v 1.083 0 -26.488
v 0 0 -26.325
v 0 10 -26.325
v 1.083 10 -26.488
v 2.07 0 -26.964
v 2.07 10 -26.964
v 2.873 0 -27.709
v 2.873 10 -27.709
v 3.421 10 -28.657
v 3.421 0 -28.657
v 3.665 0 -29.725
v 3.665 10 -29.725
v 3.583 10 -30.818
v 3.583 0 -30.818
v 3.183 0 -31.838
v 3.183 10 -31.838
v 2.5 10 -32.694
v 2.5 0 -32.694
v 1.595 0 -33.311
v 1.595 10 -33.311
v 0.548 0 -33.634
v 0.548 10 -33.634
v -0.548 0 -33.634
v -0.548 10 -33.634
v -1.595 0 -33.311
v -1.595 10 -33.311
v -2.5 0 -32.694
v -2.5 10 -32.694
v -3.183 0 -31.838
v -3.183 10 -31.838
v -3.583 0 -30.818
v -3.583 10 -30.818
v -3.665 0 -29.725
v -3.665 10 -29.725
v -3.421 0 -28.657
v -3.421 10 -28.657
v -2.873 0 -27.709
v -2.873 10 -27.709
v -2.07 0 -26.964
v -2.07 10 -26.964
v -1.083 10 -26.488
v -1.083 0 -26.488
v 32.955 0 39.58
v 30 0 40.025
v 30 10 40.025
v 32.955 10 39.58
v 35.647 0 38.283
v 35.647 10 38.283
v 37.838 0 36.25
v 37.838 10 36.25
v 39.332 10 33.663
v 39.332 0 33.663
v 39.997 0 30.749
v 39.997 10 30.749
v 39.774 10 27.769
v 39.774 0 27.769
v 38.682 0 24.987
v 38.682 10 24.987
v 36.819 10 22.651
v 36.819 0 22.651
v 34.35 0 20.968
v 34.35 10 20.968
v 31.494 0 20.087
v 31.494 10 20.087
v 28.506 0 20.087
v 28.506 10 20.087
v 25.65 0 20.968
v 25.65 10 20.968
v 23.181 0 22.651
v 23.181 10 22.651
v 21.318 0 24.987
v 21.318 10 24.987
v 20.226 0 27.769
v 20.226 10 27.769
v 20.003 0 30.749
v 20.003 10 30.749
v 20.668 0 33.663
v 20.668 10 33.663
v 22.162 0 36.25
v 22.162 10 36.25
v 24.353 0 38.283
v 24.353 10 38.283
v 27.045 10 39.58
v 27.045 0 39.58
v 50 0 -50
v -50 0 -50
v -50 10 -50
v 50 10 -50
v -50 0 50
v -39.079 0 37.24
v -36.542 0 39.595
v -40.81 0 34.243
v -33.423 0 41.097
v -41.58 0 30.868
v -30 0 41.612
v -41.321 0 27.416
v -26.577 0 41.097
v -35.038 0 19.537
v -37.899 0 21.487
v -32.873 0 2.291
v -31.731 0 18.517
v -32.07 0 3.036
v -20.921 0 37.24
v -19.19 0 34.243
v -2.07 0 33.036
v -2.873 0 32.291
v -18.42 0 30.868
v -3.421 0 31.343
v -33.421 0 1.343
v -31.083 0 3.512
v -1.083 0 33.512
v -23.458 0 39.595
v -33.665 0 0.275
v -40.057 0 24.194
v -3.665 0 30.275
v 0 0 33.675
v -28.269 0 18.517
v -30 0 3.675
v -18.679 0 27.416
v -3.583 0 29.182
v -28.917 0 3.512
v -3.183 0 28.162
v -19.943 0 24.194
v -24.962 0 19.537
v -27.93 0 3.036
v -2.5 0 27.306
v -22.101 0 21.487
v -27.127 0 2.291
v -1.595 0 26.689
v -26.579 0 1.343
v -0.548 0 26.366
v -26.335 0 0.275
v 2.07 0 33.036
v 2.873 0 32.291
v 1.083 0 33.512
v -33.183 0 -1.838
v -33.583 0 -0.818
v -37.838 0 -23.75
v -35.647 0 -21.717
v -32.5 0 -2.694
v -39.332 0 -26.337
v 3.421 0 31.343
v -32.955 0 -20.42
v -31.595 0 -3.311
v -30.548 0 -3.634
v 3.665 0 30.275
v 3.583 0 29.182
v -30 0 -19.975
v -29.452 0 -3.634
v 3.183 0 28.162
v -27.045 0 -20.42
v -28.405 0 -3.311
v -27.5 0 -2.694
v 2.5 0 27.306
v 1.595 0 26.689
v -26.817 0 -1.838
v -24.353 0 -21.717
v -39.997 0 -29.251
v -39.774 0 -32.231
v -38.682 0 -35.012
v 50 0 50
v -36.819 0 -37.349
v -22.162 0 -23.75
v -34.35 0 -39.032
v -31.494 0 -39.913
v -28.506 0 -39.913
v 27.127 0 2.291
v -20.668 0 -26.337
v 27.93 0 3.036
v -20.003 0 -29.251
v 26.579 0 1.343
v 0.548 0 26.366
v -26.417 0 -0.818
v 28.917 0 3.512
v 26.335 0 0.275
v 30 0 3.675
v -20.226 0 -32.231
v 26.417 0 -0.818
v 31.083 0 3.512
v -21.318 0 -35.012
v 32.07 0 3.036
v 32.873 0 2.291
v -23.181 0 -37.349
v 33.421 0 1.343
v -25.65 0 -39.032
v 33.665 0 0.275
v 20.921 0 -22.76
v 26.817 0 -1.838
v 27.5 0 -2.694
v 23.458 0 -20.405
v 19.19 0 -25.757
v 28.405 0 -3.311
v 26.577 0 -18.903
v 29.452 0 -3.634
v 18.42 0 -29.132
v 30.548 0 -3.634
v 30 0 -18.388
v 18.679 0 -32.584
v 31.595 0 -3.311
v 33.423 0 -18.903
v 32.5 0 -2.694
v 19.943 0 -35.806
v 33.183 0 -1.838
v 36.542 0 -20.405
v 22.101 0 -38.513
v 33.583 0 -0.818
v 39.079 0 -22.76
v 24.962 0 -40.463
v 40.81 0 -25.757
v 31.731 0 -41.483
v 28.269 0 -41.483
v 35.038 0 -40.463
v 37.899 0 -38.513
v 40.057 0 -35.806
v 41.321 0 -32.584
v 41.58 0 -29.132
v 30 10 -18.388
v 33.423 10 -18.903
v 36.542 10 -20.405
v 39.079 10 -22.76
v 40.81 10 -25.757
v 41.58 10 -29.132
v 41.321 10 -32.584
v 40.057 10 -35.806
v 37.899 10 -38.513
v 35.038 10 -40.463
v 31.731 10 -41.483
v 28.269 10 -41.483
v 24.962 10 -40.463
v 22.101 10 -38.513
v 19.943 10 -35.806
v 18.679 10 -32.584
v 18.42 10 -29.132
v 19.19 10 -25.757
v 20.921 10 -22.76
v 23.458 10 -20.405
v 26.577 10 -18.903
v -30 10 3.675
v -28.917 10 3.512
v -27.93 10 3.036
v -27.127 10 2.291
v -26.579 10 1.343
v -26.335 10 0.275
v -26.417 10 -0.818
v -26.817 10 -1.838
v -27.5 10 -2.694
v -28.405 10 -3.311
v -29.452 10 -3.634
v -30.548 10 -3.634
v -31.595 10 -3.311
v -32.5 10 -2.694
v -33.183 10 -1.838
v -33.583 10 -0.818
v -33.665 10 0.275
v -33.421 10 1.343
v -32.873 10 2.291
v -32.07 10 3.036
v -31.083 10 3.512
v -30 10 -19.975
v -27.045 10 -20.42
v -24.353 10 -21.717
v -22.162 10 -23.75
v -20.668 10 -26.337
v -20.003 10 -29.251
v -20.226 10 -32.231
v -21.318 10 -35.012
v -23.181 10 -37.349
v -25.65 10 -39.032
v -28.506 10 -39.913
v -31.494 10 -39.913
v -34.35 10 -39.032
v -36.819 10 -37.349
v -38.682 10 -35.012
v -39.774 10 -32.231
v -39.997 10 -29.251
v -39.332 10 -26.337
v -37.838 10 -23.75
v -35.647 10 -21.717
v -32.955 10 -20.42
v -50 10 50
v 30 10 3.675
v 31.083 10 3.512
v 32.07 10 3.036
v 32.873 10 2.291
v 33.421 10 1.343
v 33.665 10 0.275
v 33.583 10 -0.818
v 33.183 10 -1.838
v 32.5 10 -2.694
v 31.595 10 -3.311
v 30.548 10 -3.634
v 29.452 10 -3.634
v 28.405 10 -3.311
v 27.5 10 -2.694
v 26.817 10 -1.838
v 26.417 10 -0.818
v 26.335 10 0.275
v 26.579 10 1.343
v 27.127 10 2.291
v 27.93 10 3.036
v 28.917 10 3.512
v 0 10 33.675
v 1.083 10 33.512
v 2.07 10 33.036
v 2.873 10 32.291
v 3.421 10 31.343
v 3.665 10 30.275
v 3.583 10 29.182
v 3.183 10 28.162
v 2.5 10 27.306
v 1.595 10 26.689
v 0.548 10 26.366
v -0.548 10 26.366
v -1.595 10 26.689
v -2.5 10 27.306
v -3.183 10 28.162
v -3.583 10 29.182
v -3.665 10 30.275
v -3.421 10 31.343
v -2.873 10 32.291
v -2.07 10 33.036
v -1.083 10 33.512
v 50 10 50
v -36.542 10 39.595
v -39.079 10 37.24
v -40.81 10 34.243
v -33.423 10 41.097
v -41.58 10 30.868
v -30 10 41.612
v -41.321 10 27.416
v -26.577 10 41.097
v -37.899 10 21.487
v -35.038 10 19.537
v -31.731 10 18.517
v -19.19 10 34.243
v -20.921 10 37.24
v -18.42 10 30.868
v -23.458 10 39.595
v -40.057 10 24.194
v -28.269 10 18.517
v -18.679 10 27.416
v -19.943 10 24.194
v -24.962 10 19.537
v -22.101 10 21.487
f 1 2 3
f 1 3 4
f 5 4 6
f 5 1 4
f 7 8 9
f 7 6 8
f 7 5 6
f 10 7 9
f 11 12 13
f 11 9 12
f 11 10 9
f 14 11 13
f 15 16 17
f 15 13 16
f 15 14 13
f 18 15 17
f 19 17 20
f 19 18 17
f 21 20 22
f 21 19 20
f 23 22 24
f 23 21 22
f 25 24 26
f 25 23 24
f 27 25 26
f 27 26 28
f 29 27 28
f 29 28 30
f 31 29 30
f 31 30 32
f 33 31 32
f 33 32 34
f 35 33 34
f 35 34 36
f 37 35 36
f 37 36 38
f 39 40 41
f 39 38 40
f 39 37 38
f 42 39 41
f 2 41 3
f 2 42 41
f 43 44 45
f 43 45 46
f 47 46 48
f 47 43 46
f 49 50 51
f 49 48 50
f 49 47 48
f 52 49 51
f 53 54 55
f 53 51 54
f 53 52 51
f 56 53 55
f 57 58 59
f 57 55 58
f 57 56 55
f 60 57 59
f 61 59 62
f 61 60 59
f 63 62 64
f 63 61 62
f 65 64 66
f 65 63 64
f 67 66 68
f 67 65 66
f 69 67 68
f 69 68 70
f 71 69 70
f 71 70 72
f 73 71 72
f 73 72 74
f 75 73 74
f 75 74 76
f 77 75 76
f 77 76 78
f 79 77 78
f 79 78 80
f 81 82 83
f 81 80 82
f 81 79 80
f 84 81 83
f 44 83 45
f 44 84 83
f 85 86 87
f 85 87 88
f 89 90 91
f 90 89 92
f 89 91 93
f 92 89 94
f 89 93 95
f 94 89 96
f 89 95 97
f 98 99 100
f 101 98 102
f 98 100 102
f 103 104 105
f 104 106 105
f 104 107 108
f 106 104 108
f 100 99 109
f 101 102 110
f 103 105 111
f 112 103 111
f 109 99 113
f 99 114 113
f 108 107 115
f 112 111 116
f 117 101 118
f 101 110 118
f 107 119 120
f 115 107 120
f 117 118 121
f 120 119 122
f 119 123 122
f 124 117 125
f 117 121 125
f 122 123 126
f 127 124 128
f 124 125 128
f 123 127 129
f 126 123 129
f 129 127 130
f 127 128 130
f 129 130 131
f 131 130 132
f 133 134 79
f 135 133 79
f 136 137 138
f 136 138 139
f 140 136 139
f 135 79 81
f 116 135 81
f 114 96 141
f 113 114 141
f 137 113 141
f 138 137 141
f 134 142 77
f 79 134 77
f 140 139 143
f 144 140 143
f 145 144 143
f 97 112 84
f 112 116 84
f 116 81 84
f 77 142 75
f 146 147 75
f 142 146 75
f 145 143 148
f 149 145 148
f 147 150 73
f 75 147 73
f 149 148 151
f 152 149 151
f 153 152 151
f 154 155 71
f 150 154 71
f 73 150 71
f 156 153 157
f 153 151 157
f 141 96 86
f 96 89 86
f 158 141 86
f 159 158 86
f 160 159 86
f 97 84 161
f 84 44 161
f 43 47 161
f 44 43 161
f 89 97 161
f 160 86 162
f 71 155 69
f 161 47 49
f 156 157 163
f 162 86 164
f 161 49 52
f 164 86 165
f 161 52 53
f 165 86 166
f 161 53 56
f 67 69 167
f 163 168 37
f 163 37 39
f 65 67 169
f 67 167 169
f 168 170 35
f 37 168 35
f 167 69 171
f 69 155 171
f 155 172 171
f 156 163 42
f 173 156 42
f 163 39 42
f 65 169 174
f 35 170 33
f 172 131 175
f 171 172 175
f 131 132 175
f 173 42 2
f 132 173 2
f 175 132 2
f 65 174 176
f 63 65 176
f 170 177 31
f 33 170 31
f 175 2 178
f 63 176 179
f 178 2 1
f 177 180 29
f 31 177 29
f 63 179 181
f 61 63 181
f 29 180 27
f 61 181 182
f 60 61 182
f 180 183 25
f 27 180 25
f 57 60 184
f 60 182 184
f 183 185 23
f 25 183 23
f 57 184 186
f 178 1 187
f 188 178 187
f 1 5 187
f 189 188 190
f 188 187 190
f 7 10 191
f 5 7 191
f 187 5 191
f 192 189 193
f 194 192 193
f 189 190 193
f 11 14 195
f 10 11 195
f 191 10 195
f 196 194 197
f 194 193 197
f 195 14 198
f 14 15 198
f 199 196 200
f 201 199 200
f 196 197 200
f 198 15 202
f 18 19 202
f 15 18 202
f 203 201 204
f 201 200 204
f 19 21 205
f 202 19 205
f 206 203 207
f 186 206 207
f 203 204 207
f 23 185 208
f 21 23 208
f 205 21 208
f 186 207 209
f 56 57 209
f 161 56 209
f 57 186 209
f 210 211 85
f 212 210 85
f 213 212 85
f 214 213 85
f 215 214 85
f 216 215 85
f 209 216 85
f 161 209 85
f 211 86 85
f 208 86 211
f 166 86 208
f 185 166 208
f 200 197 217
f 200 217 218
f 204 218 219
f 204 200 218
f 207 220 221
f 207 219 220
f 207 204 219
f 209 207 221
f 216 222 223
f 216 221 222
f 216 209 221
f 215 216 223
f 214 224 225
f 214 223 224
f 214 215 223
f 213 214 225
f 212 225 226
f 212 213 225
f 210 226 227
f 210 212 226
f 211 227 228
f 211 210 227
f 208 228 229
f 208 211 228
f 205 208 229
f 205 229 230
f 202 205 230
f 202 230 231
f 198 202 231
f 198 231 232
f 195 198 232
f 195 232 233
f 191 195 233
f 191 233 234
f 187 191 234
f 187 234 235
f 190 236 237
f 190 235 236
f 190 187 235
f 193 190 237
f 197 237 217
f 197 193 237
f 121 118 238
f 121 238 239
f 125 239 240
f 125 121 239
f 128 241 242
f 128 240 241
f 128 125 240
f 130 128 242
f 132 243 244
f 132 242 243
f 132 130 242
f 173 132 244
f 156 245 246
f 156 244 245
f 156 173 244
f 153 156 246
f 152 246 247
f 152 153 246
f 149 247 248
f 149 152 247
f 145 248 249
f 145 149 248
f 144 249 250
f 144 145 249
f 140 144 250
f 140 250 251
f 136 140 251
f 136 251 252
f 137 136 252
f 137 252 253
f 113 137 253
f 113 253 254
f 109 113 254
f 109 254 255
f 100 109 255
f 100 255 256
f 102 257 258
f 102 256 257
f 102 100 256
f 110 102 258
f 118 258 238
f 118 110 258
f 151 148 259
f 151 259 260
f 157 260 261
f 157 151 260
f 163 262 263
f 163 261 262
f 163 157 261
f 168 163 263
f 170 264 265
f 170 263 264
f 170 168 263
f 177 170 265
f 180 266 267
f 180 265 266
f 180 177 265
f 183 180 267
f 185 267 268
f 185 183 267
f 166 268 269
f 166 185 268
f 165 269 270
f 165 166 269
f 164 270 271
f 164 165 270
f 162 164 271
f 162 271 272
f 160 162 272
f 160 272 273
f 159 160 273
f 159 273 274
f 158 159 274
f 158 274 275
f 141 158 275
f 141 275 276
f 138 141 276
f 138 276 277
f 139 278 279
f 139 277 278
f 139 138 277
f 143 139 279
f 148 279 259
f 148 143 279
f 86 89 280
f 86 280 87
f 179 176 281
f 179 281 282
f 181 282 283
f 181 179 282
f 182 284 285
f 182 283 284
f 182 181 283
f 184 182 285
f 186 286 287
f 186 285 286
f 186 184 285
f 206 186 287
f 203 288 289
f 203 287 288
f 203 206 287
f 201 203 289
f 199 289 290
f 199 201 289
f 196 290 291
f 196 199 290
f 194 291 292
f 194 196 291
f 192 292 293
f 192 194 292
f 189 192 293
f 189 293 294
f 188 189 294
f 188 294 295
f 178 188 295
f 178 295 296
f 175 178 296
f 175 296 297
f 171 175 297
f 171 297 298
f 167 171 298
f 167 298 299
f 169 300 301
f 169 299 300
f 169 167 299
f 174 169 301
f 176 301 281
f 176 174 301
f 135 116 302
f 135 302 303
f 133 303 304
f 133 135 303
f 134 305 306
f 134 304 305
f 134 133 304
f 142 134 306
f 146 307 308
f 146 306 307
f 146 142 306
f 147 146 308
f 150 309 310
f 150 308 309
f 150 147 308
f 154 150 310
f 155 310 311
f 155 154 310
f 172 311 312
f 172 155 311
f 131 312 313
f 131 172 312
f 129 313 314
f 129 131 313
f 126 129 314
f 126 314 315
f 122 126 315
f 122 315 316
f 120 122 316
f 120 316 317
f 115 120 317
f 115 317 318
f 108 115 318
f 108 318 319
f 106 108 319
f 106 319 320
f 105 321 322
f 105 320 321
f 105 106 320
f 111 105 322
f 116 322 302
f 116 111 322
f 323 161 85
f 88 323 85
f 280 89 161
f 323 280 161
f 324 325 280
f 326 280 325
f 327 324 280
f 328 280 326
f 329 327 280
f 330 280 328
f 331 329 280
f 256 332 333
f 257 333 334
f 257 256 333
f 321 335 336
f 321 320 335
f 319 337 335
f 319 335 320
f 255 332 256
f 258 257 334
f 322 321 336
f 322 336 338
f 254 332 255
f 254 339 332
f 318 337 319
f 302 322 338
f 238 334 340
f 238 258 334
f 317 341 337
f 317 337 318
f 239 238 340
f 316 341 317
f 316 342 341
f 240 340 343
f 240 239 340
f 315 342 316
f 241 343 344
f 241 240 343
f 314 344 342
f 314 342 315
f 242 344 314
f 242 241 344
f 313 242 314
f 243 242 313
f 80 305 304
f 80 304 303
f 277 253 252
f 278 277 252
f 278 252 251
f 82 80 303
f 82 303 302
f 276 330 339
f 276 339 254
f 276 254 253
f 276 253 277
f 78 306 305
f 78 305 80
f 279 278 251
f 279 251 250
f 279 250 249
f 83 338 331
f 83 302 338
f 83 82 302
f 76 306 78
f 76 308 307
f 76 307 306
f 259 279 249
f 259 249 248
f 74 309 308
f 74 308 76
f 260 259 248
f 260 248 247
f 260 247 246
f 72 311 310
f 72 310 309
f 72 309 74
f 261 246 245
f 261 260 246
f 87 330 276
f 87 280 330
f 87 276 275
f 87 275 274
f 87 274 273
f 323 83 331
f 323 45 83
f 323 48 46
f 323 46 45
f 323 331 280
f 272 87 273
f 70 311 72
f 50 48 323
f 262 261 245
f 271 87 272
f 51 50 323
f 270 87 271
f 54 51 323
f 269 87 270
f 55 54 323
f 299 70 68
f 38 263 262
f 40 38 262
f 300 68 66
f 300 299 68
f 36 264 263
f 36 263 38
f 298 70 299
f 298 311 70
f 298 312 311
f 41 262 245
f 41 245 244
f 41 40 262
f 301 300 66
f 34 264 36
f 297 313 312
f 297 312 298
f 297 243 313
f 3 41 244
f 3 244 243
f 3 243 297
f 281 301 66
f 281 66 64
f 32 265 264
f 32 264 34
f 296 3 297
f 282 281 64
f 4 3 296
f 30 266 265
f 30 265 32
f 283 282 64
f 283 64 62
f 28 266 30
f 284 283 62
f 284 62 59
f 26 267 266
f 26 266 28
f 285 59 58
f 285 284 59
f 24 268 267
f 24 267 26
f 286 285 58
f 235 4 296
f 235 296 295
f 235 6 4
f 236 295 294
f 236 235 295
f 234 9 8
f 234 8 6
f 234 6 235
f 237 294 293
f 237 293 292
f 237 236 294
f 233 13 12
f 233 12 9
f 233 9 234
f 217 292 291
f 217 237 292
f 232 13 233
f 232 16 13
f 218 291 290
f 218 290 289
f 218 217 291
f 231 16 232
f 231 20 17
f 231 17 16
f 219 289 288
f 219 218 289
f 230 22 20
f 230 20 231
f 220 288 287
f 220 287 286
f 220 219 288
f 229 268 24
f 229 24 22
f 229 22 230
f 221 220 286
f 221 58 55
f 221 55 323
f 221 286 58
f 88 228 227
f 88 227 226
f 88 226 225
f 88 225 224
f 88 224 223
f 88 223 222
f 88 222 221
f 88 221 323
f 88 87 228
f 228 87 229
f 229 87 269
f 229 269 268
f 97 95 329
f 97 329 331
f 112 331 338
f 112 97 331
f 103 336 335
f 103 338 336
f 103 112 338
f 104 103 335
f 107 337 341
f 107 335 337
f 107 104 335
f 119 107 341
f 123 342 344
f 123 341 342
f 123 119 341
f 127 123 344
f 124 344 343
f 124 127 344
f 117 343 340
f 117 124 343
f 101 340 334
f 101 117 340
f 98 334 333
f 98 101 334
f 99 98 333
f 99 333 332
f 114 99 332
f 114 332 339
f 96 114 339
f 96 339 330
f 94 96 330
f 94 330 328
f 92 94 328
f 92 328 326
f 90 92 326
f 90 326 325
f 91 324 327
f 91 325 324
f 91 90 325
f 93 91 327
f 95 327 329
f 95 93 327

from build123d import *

# Parameters (mm, degrees)
SKETCH1_W               = 100
SKETCH1_H               = 100
BOSS_EXTRUDE1_DEPTH     = 10
CUT_EXTRUDE3_DEPTH      = 72.414284285
CUT_EXTRUDE3_DEPTH_BACK = 72.414284285
SKETCH3_R               = 10.025
SKETCH3_R_2             = 3.675
SKETCH3_R_3             = 11.6125


with BuildPart() as part:
    # Sketch1 → Boss-Extrude1 (new body)
    with BuildSketch(Plane(origin=(0, 0, 0), x_dir=(1, 0, 0), z_dir=(0, 1, 0))):
        Rectangle(SKETCH1_W, SKETCH1_H)
    extrude(amount=BOSS_EXTRUDE1_DEPTH)

    # Sketch3 → Cut-Extrude3 (cut, two sides: drawn at the far end of the back side and taken through both)
    with BuildSketch(Plane(origin=(0, 0, 0), x_dir=(1, 0, 0), z_dir=(0, 1, 0)).offset(-CUT_EXTRUDE3_DEPTH_BACK)):
        with Locations(Location((-30, 30, 0), (0, 0, 270))):
            Circle(SKETCH3_R)
        with Locations(Location((30, -30, 0), (0, 0, 270))):
            Circle(SKETCH3_R)
        with Locations(Location((0, 30, 0), (0, 0, 270))):
            Circle(SKETCH3_R_2)
        with Locations(Location((30, 0, 0), (0, 0, 270))):
            Circle(SKETCH3_R_2)
        with Locations(Location((0, -30, 0), (0, 0, 270))):
            Circle(SKETCH3_R_2)
        with Locations(Location((-30, 0, 0), (0, 0, 270))):
            Circle(SKETCH3_R_2)
        with Locations(Location((30, 30, 0), (0, 0, 270))):
            Circle(SKETCH3_R_3)
        with Locations(Location((-30, -30, 0), (0, 0, 270))):
            Circle(SKETCH3_R_3)
    extrude(amount=CUT_EXTRUDE3_DEPTH + CUT_EXTRUDE3_DEPTH_BACK, mode=Mode.SUBTRACT)


solid = part.part
